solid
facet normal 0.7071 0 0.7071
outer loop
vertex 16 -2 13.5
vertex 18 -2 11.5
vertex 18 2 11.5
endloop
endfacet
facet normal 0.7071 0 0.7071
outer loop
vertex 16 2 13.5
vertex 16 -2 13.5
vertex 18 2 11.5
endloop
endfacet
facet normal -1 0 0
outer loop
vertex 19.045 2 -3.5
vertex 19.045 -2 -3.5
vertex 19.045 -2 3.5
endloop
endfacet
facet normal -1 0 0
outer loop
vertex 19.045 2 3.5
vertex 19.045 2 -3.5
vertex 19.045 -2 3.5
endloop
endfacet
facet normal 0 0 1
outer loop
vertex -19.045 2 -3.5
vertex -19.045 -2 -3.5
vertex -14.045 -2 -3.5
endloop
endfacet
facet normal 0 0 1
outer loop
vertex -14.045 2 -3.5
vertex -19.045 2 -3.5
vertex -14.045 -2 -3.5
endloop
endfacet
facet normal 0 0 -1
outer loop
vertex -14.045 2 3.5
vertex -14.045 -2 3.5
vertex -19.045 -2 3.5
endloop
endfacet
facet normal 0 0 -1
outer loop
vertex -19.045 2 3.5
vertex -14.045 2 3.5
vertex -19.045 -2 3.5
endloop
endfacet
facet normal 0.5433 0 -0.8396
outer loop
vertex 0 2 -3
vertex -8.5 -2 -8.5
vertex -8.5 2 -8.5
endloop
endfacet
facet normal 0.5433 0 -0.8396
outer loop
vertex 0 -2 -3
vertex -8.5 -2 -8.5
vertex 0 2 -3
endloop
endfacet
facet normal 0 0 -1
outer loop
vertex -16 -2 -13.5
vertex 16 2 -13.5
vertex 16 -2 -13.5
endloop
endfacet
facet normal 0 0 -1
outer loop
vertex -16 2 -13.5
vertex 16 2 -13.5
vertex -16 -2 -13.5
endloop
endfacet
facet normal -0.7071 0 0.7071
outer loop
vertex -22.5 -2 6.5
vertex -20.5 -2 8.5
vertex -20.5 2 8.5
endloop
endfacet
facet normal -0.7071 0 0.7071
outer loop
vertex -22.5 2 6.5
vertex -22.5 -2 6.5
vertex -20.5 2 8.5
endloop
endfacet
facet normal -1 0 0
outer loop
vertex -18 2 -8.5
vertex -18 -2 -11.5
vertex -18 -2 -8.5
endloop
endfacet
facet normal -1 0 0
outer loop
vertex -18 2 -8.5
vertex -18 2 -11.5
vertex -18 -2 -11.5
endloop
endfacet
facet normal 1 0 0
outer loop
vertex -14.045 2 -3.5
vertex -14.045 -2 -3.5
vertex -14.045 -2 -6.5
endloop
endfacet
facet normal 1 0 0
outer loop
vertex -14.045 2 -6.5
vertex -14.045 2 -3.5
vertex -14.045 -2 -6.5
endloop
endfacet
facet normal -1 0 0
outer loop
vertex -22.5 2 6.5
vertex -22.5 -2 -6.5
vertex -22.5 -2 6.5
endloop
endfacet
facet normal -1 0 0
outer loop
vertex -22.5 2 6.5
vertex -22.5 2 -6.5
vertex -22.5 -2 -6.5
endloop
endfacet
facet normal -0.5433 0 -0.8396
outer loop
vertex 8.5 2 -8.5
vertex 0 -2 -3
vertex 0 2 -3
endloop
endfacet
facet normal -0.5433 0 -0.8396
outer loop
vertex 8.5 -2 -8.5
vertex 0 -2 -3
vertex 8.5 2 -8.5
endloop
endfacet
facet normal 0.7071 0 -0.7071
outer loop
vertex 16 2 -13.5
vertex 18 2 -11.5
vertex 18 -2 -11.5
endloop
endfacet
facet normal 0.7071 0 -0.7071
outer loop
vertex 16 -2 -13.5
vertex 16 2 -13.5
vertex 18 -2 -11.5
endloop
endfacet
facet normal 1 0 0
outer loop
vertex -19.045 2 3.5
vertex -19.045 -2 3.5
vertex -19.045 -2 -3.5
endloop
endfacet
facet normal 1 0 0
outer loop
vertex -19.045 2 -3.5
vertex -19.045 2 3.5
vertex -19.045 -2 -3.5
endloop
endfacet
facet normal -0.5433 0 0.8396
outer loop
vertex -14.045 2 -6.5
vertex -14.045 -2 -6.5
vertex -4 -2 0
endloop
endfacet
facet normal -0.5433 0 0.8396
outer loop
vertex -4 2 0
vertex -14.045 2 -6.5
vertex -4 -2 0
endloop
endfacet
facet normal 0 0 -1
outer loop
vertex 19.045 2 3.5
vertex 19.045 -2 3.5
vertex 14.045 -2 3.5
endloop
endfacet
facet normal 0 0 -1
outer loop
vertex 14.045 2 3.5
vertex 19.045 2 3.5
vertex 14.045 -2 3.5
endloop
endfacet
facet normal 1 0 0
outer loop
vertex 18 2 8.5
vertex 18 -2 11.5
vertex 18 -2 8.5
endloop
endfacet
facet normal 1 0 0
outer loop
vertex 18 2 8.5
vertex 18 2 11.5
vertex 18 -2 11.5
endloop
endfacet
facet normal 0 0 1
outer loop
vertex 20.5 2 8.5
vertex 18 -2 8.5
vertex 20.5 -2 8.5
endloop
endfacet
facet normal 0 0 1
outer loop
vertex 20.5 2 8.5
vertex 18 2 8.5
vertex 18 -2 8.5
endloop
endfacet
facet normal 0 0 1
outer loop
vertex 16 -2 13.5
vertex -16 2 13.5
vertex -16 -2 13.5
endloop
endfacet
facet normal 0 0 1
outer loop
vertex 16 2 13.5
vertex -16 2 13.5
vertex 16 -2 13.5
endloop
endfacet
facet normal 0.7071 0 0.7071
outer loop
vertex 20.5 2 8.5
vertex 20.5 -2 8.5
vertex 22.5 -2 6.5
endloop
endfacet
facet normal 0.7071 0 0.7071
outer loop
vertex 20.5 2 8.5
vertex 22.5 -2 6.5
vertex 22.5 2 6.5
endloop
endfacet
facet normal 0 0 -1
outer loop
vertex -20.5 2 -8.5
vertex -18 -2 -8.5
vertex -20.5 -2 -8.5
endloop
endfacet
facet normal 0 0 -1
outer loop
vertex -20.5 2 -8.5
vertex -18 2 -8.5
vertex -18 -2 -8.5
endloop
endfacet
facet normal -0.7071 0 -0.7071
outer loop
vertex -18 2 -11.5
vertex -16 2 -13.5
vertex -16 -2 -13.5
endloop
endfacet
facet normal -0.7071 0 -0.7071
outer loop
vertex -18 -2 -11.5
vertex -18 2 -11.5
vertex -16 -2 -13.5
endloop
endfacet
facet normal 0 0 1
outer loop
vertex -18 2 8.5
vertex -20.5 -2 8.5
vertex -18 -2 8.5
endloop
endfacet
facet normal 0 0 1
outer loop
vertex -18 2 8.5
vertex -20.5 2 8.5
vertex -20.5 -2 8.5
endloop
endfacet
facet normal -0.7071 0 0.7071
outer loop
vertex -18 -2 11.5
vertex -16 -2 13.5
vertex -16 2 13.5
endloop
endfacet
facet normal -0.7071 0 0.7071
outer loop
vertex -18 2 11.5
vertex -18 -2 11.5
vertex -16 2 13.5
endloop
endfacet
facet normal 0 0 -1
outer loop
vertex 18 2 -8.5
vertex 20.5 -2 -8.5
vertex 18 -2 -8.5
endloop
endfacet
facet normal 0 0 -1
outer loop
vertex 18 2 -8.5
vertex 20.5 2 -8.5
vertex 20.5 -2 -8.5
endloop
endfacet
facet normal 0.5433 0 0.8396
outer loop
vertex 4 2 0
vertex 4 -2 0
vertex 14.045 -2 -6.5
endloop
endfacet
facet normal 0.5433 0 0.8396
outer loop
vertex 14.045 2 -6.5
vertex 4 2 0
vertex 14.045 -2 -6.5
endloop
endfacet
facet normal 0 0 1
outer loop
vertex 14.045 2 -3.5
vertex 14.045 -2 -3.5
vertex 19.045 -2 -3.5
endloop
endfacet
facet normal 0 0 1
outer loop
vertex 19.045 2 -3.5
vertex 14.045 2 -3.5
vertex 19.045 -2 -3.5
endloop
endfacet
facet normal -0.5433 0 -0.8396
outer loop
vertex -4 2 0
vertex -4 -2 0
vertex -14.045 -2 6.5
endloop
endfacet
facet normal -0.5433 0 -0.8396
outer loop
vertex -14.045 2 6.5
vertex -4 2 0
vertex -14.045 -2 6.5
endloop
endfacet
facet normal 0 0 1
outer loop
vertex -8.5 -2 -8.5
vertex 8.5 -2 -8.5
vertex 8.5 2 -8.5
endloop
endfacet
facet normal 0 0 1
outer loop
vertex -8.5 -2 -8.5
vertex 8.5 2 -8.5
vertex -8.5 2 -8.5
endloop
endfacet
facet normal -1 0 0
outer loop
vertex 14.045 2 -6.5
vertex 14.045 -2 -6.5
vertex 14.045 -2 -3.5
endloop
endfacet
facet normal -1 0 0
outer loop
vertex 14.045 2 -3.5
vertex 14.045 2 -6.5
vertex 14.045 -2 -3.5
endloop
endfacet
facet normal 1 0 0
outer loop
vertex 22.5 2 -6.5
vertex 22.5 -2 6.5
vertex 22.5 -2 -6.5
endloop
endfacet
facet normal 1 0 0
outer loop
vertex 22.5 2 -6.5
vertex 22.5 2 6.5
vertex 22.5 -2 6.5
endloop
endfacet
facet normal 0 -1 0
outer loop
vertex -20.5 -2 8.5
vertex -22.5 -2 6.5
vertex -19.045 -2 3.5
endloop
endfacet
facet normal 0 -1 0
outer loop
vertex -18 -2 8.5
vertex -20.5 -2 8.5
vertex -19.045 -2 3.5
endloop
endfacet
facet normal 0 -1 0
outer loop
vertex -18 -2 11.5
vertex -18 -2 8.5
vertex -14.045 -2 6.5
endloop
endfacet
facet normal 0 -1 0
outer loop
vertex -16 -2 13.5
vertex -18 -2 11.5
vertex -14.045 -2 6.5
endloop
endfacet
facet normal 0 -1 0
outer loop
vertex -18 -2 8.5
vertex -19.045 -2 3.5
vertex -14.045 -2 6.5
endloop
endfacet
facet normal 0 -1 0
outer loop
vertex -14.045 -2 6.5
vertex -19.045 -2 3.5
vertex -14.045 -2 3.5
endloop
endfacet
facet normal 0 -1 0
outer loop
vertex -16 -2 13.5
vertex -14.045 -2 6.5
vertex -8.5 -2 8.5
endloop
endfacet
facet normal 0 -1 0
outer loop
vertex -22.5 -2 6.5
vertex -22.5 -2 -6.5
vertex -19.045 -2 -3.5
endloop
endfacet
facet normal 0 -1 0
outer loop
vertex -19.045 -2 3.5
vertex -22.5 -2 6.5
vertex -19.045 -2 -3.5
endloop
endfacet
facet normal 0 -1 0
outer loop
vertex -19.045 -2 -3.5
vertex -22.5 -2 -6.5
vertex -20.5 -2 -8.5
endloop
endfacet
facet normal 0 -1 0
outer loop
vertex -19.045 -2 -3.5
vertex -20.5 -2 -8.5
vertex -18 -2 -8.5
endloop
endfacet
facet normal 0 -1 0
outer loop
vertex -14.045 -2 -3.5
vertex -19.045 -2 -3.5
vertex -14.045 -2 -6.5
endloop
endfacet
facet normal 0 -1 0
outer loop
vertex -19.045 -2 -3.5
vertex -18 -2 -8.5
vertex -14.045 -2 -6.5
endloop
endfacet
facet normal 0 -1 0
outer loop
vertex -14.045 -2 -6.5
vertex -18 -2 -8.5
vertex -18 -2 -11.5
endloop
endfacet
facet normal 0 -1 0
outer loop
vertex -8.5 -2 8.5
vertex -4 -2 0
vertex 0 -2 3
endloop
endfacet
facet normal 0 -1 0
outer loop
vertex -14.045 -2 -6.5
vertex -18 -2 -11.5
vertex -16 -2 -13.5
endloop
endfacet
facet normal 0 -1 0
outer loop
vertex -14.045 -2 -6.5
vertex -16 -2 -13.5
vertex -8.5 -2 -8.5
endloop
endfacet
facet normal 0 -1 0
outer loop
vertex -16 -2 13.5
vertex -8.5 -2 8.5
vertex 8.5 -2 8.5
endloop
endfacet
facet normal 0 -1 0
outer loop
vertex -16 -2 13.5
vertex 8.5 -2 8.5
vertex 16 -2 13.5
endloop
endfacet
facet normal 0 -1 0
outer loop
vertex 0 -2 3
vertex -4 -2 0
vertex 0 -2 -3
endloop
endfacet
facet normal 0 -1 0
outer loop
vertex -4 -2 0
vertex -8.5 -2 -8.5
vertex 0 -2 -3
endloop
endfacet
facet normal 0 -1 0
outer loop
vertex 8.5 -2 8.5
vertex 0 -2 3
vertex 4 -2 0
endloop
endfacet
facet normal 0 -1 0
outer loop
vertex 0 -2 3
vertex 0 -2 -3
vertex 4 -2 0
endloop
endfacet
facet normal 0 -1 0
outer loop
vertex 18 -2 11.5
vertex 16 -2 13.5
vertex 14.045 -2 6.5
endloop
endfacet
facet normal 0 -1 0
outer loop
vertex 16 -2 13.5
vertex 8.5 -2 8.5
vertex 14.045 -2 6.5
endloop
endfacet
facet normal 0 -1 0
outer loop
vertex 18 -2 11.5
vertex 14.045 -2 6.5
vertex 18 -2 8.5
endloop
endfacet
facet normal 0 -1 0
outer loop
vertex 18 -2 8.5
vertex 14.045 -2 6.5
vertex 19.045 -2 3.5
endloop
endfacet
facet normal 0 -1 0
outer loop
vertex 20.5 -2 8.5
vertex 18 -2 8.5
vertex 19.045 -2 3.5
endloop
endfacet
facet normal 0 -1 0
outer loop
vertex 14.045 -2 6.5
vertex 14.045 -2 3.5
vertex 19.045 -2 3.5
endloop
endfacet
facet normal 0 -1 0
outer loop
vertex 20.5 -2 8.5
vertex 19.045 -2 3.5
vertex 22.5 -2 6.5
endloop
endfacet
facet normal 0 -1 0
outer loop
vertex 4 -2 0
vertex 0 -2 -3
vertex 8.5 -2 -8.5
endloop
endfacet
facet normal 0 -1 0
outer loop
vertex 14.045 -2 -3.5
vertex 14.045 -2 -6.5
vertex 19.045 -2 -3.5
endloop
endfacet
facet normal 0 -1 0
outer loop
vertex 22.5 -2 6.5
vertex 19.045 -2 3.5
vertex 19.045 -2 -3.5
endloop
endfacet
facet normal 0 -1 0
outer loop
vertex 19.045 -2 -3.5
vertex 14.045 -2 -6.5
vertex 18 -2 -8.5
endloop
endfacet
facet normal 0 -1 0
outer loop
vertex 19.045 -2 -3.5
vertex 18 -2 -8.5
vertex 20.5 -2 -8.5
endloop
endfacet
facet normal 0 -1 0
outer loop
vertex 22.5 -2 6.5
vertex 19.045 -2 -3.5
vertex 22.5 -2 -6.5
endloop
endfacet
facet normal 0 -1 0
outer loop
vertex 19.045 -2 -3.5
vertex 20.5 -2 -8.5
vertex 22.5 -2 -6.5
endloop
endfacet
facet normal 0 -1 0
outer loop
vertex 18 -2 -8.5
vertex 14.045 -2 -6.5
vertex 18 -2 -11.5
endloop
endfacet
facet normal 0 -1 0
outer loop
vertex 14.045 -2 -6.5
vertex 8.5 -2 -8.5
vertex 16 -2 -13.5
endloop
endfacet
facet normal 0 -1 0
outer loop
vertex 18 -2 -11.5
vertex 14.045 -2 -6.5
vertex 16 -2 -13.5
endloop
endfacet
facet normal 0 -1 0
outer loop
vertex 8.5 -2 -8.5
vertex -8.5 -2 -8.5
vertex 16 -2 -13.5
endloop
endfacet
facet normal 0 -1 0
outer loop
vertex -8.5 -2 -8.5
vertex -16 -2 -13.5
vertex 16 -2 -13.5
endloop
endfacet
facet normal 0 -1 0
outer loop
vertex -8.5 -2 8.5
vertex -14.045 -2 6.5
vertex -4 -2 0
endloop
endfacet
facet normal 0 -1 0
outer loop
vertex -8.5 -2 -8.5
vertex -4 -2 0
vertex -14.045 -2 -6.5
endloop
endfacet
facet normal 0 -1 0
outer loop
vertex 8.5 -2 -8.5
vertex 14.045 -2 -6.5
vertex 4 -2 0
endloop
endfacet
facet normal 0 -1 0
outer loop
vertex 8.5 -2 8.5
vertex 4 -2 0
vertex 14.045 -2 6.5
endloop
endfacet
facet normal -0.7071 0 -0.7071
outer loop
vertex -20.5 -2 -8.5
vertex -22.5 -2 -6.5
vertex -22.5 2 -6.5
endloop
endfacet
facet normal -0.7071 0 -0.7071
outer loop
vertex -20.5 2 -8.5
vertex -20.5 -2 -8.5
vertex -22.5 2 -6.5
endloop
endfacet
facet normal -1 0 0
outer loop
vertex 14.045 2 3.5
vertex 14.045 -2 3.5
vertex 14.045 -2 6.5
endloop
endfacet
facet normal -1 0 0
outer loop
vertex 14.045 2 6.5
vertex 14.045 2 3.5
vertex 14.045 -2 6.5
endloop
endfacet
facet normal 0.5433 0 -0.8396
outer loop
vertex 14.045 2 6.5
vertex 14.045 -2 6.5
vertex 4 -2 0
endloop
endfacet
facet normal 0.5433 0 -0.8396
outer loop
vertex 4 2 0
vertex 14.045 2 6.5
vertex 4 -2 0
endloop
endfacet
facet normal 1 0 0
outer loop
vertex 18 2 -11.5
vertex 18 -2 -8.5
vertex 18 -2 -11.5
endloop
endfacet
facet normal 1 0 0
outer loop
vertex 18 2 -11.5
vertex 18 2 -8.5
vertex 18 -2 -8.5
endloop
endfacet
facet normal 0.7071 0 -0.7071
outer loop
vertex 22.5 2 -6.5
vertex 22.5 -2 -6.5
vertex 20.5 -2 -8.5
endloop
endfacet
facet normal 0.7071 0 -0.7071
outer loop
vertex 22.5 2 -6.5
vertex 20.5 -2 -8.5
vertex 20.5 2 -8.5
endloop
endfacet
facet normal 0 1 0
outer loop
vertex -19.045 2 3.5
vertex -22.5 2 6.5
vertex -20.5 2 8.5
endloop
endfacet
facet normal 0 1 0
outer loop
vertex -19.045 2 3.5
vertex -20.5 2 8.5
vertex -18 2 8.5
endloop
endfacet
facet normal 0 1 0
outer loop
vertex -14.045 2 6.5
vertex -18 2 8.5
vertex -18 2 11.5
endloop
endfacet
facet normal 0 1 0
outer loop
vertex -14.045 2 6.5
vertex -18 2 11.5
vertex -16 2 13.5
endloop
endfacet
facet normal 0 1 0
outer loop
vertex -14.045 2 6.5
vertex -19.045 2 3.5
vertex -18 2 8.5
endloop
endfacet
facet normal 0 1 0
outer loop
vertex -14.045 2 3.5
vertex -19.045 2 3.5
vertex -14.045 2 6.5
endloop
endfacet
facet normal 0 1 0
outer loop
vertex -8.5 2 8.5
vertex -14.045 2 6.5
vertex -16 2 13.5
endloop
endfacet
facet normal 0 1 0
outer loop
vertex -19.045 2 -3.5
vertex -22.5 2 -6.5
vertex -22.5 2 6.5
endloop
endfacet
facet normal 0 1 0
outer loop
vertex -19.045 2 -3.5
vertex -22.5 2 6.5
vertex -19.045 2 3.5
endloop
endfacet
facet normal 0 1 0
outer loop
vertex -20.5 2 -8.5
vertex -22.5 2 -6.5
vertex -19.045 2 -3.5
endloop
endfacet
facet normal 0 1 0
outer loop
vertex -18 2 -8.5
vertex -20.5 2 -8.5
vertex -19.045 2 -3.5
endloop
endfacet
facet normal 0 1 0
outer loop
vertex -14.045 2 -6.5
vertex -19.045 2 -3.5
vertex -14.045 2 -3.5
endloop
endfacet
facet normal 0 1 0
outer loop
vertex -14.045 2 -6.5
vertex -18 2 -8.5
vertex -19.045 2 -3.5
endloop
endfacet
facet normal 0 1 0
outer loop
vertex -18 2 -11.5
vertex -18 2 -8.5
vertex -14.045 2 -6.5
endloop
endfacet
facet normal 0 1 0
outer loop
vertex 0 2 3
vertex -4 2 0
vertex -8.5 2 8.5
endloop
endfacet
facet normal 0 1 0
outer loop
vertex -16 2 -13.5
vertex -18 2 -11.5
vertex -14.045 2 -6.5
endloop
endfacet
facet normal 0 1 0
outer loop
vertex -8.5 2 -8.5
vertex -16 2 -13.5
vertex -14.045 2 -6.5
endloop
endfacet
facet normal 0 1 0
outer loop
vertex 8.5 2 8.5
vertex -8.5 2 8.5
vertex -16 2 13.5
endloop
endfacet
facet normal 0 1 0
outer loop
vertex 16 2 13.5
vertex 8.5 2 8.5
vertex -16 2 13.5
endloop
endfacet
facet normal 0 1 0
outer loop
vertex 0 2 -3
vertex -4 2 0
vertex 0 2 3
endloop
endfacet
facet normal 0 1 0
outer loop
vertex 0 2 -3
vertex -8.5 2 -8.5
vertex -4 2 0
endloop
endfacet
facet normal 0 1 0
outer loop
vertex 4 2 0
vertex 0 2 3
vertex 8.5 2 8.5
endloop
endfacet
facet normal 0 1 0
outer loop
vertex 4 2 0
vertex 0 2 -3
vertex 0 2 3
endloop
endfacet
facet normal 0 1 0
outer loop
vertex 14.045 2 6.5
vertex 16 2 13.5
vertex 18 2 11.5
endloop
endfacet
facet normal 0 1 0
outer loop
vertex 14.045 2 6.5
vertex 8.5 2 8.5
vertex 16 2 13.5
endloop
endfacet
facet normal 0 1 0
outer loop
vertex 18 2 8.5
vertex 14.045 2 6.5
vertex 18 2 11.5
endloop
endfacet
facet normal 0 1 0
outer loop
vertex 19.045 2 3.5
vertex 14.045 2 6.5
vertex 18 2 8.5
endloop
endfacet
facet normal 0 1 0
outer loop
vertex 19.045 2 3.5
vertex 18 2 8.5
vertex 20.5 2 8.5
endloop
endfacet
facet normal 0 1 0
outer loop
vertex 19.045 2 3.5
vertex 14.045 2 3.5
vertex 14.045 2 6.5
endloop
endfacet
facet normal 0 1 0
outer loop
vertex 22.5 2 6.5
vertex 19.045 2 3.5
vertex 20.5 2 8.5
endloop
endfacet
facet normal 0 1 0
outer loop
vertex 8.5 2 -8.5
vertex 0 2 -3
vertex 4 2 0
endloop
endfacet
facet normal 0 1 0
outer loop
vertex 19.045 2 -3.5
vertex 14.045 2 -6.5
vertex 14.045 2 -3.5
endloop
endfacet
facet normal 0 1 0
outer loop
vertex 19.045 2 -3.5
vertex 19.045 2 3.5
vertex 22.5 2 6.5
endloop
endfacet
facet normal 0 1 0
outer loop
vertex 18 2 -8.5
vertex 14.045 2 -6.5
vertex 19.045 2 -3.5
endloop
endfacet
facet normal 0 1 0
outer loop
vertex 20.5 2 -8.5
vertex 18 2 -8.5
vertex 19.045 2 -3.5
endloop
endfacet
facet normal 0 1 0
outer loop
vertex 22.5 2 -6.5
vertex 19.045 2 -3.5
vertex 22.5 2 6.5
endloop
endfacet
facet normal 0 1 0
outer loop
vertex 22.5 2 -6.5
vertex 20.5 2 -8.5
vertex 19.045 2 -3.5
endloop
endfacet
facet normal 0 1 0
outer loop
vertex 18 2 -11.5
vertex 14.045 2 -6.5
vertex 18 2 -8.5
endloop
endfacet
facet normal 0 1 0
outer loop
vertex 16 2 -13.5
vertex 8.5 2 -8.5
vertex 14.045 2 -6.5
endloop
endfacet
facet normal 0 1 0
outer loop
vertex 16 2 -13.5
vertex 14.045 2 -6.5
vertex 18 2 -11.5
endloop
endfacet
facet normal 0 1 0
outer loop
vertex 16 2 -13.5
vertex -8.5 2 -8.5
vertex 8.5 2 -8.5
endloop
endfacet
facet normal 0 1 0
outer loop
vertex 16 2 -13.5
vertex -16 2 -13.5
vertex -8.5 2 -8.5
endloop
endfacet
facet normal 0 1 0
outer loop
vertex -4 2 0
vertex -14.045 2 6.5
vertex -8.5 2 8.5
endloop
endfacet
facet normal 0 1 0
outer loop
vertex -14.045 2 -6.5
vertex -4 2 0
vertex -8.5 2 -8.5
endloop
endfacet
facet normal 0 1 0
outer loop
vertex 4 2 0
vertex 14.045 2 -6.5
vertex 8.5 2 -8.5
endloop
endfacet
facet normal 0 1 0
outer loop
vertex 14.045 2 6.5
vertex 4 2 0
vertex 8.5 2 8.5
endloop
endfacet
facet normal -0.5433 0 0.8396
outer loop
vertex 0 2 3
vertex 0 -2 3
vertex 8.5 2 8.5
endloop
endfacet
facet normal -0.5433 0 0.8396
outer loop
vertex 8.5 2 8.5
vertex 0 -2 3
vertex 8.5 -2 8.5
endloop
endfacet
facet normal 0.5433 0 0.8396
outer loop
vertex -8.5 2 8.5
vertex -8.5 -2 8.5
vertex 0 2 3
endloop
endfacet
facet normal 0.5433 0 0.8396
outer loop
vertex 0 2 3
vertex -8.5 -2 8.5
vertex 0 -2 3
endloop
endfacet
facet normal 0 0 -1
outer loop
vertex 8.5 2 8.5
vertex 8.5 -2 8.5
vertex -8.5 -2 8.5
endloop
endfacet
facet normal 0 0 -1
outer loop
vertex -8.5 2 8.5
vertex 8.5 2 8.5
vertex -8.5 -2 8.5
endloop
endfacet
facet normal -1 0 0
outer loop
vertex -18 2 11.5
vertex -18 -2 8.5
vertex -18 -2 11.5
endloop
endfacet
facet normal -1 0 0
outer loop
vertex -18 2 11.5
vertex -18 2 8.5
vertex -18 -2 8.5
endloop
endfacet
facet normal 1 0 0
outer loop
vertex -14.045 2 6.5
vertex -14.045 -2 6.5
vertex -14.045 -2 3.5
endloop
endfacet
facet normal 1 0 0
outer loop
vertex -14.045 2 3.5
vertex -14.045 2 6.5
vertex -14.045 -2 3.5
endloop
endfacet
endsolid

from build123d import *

# Parameters (mm, degrees)
EXTRUDE_1_DEPTH          = 2
CUT_EXTRUDE_1_DEPTH      = 27.54241888
CUT_EXTRUDE_1_DEPTH_BACK = 27.54241888
CHAMFER_1_SIZE           = 2


with BuildPart() as part:
    # 草图1 → 凸台-拉伸1 (new, symmetric)
    with BuildSketch(Plane(origin=(0, 0, 0), x_dir=(1, 0, 0), z_dir=(0, 1, 0))):
        Polygon((-18, 13.5), (-18, 8.5), (-22.5, 8.5), (-22.5, -8.5), (-18, -8.5), (-18, -13.5), (18, -13.5), (18, -8.5), (22.5, -8.5), (22.5, 8.5), (18, 8.5), (18, 13.5), align=None)
    extrude(amount=EXTRUDE_1_DEPTH, both=True)

    # 草图2 → 切除-拉伸1 (cut, two sides: drawn at the far end of the back side and taken through both)
    with BuildSketch(Plane(origin=(0, 2, 0), x_dir=(1, 0, 0), z_dir=(0, 1, 0)).offset(-CUT_EXTRUDE_1_DEPTH_BACK)):
        Polygon((0, 3), (8.5, 8.5), (-8.5, 8.5), align=None)
        Polygon((4, 0), (14.045454545, 6.5), (14.045454545, 3.5), (19.045454545, 3.5), (19.045454545, -3.5), (14.045454545, -3.5), (14.045454545, -6.5), align=None)
        Polygon((8.5, -8.5), (-8.5, -8.5), (0, -3), align=None)
        Polygon((-4, 0), (-14.045454545, -6.5), (-14.045454545, -3.5), (-19.045454545, -3.5), (-19.045454545, 3.5), (-14.045454545, 3.5), (-14.045454545, 6.5), align=None)
    extrude(amount=CUT_EXTRUDE_1_DEPTH + CUT_EXTRUDE_1_DEPTH_BACK, mode=Mode.SUBTRACT)

    # 倒角1
    chamfer_1_edges = [part.edges().sort_by_distance(p)[0] for p in [
        (22.5, 0, -8.5),
        (22.5, 0, 8.5),
        (18, 0, 13.5),
        (-18, 0, 13.5),
        (-22.5, 0, 8.5),
        (-22.5, 0, -8.5),
        (-18, 0, -13.5),
        (18, 0, -13.5),
    ]]
    chamfer(chamfer_1_edges, length=CHAMFER_1_SIZE)


solid = part.part
